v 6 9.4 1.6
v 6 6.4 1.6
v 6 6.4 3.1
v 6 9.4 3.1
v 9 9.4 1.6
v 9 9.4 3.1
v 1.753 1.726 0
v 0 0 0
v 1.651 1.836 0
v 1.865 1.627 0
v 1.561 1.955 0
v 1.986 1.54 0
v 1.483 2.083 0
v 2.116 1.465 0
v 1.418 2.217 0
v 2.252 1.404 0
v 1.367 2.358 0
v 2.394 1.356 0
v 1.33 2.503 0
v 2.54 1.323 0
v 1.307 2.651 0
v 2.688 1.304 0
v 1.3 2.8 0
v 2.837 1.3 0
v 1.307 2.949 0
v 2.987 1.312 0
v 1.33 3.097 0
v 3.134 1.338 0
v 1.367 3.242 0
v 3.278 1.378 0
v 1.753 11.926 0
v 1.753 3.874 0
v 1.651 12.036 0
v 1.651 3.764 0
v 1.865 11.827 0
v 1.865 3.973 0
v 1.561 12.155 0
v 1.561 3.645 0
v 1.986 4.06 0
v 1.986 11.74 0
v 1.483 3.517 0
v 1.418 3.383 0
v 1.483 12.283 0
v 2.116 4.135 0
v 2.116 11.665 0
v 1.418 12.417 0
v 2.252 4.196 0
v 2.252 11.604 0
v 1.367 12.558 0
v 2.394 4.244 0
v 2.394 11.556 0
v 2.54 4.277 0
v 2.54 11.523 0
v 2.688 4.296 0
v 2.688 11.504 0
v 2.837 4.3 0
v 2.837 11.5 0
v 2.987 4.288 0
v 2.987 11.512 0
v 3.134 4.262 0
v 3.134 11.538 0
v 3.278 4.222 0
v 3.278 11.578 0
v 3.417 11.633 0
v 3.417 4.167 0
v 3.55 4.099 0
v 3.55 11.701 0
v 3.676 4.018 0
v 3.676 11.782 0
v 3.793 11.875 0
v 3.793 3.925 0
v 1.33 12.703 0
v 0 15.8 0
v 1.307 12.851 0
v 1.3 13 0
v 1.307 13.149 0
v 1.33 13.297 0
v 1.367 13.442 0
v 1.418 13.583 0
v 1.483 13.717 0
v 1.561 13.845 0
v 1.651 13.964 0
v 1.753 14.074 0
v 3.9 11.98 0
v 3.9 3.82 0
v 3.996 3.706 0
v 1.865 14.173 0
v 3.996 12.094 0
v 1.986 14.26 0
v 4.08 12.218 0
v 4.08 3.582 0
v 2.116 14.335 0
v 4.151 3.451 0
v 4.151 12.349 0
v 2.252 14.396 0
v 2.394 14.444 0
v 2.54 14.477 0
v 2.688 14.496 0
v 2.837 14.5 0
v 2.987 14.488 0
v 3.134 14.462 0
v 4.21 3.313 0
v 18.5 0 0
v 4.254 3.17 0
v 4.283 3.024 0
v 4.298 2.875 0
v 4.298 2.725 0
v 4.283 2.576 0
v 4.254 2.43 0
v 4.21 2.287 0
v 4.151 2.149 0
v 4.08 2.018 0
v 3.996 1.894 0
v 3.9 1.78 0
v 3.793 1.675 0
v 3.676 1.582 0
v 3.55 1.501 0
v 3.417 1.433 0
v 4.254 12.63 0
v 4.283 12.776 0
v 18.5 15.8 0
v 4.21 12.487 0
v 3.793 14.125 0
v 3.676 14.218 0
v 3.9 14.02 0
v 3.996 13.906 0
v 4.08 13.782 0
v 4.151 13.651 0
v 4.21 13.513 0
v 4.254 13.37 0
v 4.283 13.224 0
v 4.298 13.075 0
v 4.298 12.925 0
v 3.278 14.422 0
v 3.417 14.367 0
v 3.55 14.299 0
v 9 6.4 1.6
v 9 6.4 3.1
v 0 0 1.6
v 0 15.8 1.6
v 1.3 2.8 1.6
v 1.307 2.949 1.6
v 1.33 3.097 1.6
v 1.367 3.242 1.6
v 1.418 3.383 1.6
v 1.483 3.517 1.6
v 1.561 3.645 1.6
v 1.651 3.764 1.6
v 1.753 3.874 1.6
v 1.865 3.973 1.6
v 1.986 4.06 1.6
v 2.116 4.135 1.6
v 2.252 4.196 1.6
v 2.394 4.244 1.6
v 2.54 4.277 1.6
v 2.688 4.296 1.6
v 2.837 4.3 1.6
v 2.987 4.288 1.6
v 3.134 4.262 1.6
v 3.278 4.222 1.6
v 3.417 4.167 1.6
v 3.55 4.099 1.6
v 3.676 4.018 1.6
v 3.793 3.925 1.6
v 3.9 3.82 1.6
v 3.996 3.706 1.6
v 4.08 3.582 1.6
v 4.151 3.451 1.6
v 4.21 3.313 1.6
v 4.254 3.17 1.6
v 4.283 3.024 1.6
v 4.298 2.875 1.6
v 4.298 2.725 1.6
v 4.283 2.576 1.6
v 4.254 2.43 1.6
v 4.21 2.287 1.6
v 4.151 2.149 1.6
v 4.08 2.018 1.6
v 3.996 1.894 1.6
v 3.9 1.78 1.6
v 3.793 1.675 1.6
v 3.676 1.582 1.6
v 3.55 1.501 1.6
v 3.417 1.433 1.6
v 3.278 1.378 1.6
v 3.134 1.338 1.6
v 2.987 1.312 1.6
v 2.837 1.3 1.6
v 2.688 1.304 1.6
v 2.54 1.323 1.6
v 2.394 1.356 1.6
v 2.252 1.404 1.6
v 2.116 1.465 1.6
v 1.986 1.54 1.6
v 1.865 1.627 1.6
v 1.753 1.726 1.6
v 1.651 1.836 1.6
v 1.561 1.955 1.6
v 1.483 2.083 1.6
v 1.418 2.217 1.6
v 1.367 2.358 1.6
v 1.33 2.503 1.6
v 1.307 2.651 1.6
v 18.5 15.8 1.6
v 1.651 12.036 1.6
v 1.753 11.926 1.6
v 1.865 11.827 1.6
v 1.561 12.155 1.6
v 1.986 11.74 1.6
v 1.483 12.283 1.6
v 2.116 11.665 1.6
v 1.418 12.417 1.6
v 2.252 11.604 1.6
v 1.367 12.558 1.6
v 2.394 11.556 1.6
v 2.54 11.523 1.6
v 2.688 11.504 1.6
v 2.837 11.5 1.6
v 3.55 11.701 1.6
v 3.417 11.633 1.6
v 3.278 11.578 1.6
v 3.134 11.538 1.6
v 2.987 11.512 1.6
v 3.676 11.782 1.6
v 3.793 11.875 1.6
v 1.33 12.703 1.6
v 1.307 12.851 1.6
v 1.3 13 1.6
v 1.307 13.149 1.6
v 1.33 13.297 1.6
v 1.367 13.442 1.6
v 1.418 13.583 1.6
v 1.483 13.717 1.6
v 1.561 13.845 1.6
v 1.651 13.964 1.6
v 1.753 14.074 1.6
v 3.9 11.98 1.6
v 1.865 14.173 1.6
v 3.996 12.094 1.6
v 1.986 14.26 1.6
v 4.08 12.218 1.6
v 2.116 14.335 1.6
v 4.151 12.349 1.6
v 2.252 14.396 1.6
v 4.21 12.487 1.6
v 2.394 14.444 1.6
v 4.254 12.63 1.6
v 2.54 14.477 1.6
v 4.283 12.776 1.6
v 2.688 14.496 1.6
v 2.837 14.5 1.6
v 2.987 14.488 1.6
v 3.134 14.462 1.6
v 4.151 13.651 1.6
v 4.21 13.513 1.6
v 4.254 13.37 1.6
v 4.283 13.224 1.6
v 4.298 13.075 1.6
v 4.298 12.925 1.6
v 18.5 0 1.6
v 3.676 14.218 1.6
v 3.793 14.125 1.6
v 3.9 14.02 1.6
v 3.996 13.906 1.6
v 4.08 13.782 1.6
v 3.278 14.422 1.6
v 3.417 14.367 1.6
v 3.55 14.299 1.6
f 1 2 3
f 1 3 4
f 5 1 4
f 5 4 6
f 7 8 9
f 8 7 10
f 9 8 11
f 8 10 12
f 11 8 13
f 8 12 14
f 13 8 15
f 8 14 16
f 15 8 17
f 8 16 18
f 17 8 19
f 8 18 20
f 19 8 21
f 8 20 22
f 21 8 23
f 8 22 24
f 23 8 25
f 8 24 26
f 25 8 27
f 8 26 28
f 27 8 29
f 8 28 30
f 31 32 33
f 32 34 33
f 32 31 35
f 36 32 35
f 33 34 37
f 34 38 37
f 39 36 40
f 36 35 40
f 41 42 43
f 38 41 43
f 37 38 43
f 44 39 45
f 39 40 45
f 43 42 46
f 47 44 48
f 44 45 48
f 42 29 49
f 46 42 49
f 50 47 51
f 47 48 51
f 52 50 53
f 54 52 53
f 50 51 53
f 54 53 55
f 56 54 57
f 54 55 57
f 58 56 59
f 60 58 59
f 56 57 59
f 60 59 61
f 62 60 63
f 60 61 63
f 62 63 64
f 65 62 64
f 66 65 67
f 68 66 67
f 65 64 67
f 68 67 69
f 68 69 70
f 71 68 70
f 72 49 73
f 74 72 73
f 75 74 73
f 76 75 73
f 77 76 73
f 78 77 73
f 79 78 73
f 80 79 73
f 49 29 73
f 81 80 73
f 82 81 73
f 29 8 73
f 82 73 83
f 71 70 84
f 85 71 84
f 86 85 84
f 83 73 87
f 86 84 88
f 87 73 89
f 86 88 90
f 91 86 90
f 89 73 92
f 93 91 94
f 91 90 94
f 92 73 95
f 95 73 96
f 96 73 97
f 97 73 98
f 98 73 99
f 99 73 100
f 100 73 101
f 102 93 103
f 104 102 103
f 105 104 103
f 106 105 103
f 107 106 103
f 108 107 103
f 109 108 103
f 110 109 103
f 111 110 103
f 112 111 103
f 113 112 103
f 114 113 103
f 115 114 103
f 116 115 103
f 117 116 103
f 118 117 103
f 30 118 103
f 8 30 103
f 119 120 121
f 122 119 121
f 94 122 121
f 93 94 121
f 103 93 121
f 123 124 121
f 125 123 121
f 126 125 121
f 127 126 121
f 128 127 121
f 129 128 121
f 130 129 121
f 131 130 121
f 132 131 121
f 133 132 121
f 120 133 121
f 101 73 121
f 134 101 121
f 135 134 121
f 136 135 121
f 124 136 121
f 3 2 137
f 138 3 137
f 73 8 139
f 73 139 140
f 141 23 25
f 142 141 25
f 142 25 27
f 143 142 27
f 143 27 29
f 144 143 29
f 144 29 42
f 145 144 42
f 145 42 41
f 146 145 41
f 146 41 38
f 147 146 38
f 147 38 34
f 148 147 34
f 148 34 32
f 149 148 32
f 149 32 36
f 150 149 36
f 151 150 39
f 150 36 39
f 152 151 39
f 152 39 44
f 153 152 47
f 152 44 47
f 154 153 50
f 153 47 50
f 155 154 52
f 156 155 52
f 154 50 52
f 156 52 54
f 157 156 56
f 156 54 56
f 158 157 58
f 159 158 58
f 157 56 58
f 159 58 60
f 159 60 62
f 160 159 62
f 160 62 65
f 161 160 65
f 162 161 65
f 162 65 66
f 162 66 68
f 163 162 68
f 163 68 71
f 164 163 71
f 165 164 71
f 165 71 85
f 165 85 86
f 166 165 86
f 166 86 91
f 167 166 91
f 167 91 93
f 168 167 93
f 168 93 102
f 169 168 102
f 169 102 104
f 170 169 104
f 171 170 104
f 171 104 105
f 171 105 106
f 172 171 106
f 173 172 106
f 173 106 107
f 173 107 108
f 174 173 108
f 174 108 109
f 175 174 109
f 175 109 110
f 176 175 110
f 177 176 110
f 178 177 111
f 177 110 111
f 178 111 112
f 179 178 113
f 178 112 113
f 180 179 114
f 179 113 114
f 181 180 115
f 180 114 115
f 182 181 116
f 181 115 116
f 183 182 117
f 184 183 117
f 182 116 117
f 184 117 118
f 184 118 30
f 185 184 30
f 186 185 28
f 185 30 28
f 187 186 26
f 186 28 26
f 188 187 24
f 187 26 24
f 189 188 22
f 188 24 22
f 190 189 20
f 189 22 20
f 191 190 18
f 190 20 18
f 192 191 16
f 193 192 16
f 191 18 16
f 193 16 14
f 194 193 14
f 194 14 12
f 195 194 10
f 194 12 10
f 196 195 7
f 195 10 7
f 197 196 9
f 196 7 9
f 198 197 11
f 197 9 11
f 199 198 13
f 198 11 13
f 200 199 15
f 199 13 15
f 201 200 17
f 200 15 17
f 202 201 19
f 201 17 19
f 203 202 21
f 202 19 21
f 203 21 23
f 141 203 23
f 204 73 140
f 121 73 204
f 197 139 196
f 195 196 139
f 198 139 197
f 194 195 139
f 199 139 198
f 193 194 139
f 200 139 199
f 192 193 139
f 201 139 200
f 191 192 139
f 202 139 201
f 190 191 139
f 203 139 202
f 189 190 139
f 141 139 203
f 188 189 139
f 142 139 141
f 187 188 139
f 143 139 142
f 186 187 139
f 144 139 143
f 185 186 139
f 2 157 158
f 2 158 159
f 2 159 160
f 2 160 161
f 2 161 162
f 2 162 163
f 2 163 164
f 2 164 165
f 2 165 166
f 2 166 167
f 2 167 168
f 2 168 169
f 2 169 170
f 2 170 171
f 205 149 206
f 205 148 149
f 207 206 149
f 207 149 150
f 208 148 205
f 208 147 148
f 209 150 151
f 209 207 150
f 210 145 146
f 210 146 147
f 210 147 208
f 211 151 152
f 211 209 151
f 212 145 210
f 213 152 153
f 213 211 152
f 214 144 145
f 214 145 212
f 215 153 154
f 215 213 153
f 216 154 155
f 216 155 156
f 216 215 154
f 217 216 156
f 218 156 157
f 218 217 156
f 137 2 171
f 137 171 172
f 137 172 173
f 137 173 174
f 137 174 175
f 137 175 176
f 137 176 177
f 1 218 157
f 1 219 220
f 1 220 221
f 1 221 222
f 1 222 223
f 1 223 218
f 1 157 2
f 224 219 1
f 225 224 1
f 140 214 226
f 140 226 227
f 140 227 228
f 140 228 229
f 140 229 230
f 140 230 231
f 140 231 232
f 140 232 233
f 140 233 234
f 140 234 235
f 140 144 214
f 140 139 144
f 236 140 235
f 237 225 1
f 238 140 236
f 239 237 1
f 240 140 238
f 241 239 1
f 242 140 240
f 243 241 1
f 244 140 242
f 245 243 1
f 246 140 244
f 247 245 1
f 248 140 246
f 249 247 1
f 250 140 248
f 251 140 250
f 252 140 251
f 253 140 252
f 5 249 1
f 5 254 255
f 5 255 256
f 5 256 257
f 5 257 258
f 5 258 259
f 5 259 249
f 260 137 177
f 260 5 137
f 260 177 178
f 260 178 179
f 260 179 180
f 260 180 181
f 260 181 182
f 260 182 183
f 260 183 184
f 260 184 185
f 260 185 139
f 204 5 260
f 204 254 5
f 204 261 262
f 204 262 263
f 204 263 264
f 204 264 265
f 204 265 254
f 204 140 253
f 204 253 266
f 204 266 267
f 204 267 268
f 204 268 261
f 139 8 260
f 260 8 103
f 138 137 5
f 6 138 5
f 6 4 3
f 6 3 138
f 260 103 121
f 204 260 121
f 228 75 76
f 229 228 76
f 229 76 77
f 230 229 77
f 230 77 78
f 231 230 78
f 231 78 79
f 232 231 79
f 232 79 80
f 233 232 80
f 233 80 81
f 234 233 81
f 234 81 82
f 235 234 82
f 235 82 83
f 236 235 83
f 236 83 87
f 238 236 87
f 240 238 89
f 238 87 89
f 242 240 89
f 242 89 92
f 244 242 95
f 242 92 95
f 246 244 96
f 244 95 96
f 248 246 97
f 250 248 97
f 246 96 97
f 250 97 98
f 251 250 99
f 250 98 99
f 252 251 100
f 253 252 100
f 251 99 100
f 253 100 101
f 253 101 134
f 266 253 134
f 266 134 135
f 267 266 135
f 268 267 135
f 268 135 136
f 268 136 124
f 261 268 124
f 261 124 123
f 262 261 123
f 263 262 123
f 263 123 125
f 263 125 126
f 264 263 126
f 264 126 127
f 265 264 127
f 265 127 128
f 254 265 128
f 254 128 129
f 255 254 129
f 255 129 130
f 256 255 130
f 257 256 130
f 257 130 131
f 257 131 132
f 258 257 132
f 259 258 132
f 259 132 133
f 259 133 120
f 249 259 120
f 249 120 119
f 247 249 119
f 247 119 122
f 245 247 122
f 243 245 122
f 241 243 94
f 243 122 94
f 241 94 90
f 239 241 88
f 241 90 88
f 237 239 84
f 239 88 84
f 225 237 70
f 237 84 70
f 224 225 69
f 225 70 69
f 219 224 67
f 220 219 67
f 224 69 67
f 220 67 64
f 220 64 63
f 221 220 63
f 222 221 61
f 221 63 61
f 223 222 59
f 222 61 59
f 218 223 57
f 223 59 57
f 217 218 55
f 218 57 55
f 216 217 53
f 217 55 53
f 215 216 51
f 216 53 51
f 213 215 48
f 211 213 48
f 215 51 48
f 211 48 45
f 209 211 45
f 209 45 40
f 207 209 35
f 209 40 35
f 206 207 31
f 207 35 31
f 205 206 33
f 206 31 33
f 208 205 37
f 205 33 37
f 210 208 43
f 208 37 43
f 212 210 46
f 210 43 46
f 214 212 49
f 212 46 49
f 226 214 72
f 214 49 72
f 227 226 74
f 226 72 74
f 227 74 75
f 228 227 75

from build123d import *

# Parameters (mm, degrees)
SZKIC1_W                    = 18.5
SZKIC1_H                    = 15.8
DODANIE_WYCI_GNI_CIE1_DEPTH = 1.6
SZKIC2_R                    = 1.5
WYTNIJ_WYCI_GNI_CIE1_DEPTH  = 2.6
SZKIC3_W                    = 3
SZKIC3_H                    = 3
DODANIE_WYCI_GNI_CIE2_DEPTH = 1.5


with BuildPart() as part:
    # Szkic1 → Dodanie-wyciągnięcie1 (new body)
    with BuildSketch(Plane.XY):
        with Locations((9.25, 7.9)):
            Rectangle(SZKIC1_W, SZKIC1_H)
    extrude(amount=DODANIE_WYCI_GNI_CIE1_DEPTH)

    # Szkic2 → Wytnij-wyciągnięcie1 (cut, through all)
    with BuildSketch(Plane(origin=(0, 0, 0), x_dir=(-1, 0, 0), z_dir=(0, 0, -1))):
        with Locations((-2.8, 13)):
            Circle(SZKIC2_R)
        with Locations((-2.8, 2.8)):
            Circle(SZKIC2_R)
    extrude(amount=-WYTNIJ_WYCI_GNI_CIE1_DEPTH, mode=Mode.SUBTRACT)

    # Szkic3 → Dodanie-wyciągnięcie2 (add)
    with BuildSketch(Plane.XY.offset(1.6)):
        with Locations((7.5, 7.9)):
            Rectangle(SZKIC3_W, SZKIC3_H)
    extrude(amount=DODANIE_WYCI_GNI_CIE2_DEPTH)


solid = part.part
